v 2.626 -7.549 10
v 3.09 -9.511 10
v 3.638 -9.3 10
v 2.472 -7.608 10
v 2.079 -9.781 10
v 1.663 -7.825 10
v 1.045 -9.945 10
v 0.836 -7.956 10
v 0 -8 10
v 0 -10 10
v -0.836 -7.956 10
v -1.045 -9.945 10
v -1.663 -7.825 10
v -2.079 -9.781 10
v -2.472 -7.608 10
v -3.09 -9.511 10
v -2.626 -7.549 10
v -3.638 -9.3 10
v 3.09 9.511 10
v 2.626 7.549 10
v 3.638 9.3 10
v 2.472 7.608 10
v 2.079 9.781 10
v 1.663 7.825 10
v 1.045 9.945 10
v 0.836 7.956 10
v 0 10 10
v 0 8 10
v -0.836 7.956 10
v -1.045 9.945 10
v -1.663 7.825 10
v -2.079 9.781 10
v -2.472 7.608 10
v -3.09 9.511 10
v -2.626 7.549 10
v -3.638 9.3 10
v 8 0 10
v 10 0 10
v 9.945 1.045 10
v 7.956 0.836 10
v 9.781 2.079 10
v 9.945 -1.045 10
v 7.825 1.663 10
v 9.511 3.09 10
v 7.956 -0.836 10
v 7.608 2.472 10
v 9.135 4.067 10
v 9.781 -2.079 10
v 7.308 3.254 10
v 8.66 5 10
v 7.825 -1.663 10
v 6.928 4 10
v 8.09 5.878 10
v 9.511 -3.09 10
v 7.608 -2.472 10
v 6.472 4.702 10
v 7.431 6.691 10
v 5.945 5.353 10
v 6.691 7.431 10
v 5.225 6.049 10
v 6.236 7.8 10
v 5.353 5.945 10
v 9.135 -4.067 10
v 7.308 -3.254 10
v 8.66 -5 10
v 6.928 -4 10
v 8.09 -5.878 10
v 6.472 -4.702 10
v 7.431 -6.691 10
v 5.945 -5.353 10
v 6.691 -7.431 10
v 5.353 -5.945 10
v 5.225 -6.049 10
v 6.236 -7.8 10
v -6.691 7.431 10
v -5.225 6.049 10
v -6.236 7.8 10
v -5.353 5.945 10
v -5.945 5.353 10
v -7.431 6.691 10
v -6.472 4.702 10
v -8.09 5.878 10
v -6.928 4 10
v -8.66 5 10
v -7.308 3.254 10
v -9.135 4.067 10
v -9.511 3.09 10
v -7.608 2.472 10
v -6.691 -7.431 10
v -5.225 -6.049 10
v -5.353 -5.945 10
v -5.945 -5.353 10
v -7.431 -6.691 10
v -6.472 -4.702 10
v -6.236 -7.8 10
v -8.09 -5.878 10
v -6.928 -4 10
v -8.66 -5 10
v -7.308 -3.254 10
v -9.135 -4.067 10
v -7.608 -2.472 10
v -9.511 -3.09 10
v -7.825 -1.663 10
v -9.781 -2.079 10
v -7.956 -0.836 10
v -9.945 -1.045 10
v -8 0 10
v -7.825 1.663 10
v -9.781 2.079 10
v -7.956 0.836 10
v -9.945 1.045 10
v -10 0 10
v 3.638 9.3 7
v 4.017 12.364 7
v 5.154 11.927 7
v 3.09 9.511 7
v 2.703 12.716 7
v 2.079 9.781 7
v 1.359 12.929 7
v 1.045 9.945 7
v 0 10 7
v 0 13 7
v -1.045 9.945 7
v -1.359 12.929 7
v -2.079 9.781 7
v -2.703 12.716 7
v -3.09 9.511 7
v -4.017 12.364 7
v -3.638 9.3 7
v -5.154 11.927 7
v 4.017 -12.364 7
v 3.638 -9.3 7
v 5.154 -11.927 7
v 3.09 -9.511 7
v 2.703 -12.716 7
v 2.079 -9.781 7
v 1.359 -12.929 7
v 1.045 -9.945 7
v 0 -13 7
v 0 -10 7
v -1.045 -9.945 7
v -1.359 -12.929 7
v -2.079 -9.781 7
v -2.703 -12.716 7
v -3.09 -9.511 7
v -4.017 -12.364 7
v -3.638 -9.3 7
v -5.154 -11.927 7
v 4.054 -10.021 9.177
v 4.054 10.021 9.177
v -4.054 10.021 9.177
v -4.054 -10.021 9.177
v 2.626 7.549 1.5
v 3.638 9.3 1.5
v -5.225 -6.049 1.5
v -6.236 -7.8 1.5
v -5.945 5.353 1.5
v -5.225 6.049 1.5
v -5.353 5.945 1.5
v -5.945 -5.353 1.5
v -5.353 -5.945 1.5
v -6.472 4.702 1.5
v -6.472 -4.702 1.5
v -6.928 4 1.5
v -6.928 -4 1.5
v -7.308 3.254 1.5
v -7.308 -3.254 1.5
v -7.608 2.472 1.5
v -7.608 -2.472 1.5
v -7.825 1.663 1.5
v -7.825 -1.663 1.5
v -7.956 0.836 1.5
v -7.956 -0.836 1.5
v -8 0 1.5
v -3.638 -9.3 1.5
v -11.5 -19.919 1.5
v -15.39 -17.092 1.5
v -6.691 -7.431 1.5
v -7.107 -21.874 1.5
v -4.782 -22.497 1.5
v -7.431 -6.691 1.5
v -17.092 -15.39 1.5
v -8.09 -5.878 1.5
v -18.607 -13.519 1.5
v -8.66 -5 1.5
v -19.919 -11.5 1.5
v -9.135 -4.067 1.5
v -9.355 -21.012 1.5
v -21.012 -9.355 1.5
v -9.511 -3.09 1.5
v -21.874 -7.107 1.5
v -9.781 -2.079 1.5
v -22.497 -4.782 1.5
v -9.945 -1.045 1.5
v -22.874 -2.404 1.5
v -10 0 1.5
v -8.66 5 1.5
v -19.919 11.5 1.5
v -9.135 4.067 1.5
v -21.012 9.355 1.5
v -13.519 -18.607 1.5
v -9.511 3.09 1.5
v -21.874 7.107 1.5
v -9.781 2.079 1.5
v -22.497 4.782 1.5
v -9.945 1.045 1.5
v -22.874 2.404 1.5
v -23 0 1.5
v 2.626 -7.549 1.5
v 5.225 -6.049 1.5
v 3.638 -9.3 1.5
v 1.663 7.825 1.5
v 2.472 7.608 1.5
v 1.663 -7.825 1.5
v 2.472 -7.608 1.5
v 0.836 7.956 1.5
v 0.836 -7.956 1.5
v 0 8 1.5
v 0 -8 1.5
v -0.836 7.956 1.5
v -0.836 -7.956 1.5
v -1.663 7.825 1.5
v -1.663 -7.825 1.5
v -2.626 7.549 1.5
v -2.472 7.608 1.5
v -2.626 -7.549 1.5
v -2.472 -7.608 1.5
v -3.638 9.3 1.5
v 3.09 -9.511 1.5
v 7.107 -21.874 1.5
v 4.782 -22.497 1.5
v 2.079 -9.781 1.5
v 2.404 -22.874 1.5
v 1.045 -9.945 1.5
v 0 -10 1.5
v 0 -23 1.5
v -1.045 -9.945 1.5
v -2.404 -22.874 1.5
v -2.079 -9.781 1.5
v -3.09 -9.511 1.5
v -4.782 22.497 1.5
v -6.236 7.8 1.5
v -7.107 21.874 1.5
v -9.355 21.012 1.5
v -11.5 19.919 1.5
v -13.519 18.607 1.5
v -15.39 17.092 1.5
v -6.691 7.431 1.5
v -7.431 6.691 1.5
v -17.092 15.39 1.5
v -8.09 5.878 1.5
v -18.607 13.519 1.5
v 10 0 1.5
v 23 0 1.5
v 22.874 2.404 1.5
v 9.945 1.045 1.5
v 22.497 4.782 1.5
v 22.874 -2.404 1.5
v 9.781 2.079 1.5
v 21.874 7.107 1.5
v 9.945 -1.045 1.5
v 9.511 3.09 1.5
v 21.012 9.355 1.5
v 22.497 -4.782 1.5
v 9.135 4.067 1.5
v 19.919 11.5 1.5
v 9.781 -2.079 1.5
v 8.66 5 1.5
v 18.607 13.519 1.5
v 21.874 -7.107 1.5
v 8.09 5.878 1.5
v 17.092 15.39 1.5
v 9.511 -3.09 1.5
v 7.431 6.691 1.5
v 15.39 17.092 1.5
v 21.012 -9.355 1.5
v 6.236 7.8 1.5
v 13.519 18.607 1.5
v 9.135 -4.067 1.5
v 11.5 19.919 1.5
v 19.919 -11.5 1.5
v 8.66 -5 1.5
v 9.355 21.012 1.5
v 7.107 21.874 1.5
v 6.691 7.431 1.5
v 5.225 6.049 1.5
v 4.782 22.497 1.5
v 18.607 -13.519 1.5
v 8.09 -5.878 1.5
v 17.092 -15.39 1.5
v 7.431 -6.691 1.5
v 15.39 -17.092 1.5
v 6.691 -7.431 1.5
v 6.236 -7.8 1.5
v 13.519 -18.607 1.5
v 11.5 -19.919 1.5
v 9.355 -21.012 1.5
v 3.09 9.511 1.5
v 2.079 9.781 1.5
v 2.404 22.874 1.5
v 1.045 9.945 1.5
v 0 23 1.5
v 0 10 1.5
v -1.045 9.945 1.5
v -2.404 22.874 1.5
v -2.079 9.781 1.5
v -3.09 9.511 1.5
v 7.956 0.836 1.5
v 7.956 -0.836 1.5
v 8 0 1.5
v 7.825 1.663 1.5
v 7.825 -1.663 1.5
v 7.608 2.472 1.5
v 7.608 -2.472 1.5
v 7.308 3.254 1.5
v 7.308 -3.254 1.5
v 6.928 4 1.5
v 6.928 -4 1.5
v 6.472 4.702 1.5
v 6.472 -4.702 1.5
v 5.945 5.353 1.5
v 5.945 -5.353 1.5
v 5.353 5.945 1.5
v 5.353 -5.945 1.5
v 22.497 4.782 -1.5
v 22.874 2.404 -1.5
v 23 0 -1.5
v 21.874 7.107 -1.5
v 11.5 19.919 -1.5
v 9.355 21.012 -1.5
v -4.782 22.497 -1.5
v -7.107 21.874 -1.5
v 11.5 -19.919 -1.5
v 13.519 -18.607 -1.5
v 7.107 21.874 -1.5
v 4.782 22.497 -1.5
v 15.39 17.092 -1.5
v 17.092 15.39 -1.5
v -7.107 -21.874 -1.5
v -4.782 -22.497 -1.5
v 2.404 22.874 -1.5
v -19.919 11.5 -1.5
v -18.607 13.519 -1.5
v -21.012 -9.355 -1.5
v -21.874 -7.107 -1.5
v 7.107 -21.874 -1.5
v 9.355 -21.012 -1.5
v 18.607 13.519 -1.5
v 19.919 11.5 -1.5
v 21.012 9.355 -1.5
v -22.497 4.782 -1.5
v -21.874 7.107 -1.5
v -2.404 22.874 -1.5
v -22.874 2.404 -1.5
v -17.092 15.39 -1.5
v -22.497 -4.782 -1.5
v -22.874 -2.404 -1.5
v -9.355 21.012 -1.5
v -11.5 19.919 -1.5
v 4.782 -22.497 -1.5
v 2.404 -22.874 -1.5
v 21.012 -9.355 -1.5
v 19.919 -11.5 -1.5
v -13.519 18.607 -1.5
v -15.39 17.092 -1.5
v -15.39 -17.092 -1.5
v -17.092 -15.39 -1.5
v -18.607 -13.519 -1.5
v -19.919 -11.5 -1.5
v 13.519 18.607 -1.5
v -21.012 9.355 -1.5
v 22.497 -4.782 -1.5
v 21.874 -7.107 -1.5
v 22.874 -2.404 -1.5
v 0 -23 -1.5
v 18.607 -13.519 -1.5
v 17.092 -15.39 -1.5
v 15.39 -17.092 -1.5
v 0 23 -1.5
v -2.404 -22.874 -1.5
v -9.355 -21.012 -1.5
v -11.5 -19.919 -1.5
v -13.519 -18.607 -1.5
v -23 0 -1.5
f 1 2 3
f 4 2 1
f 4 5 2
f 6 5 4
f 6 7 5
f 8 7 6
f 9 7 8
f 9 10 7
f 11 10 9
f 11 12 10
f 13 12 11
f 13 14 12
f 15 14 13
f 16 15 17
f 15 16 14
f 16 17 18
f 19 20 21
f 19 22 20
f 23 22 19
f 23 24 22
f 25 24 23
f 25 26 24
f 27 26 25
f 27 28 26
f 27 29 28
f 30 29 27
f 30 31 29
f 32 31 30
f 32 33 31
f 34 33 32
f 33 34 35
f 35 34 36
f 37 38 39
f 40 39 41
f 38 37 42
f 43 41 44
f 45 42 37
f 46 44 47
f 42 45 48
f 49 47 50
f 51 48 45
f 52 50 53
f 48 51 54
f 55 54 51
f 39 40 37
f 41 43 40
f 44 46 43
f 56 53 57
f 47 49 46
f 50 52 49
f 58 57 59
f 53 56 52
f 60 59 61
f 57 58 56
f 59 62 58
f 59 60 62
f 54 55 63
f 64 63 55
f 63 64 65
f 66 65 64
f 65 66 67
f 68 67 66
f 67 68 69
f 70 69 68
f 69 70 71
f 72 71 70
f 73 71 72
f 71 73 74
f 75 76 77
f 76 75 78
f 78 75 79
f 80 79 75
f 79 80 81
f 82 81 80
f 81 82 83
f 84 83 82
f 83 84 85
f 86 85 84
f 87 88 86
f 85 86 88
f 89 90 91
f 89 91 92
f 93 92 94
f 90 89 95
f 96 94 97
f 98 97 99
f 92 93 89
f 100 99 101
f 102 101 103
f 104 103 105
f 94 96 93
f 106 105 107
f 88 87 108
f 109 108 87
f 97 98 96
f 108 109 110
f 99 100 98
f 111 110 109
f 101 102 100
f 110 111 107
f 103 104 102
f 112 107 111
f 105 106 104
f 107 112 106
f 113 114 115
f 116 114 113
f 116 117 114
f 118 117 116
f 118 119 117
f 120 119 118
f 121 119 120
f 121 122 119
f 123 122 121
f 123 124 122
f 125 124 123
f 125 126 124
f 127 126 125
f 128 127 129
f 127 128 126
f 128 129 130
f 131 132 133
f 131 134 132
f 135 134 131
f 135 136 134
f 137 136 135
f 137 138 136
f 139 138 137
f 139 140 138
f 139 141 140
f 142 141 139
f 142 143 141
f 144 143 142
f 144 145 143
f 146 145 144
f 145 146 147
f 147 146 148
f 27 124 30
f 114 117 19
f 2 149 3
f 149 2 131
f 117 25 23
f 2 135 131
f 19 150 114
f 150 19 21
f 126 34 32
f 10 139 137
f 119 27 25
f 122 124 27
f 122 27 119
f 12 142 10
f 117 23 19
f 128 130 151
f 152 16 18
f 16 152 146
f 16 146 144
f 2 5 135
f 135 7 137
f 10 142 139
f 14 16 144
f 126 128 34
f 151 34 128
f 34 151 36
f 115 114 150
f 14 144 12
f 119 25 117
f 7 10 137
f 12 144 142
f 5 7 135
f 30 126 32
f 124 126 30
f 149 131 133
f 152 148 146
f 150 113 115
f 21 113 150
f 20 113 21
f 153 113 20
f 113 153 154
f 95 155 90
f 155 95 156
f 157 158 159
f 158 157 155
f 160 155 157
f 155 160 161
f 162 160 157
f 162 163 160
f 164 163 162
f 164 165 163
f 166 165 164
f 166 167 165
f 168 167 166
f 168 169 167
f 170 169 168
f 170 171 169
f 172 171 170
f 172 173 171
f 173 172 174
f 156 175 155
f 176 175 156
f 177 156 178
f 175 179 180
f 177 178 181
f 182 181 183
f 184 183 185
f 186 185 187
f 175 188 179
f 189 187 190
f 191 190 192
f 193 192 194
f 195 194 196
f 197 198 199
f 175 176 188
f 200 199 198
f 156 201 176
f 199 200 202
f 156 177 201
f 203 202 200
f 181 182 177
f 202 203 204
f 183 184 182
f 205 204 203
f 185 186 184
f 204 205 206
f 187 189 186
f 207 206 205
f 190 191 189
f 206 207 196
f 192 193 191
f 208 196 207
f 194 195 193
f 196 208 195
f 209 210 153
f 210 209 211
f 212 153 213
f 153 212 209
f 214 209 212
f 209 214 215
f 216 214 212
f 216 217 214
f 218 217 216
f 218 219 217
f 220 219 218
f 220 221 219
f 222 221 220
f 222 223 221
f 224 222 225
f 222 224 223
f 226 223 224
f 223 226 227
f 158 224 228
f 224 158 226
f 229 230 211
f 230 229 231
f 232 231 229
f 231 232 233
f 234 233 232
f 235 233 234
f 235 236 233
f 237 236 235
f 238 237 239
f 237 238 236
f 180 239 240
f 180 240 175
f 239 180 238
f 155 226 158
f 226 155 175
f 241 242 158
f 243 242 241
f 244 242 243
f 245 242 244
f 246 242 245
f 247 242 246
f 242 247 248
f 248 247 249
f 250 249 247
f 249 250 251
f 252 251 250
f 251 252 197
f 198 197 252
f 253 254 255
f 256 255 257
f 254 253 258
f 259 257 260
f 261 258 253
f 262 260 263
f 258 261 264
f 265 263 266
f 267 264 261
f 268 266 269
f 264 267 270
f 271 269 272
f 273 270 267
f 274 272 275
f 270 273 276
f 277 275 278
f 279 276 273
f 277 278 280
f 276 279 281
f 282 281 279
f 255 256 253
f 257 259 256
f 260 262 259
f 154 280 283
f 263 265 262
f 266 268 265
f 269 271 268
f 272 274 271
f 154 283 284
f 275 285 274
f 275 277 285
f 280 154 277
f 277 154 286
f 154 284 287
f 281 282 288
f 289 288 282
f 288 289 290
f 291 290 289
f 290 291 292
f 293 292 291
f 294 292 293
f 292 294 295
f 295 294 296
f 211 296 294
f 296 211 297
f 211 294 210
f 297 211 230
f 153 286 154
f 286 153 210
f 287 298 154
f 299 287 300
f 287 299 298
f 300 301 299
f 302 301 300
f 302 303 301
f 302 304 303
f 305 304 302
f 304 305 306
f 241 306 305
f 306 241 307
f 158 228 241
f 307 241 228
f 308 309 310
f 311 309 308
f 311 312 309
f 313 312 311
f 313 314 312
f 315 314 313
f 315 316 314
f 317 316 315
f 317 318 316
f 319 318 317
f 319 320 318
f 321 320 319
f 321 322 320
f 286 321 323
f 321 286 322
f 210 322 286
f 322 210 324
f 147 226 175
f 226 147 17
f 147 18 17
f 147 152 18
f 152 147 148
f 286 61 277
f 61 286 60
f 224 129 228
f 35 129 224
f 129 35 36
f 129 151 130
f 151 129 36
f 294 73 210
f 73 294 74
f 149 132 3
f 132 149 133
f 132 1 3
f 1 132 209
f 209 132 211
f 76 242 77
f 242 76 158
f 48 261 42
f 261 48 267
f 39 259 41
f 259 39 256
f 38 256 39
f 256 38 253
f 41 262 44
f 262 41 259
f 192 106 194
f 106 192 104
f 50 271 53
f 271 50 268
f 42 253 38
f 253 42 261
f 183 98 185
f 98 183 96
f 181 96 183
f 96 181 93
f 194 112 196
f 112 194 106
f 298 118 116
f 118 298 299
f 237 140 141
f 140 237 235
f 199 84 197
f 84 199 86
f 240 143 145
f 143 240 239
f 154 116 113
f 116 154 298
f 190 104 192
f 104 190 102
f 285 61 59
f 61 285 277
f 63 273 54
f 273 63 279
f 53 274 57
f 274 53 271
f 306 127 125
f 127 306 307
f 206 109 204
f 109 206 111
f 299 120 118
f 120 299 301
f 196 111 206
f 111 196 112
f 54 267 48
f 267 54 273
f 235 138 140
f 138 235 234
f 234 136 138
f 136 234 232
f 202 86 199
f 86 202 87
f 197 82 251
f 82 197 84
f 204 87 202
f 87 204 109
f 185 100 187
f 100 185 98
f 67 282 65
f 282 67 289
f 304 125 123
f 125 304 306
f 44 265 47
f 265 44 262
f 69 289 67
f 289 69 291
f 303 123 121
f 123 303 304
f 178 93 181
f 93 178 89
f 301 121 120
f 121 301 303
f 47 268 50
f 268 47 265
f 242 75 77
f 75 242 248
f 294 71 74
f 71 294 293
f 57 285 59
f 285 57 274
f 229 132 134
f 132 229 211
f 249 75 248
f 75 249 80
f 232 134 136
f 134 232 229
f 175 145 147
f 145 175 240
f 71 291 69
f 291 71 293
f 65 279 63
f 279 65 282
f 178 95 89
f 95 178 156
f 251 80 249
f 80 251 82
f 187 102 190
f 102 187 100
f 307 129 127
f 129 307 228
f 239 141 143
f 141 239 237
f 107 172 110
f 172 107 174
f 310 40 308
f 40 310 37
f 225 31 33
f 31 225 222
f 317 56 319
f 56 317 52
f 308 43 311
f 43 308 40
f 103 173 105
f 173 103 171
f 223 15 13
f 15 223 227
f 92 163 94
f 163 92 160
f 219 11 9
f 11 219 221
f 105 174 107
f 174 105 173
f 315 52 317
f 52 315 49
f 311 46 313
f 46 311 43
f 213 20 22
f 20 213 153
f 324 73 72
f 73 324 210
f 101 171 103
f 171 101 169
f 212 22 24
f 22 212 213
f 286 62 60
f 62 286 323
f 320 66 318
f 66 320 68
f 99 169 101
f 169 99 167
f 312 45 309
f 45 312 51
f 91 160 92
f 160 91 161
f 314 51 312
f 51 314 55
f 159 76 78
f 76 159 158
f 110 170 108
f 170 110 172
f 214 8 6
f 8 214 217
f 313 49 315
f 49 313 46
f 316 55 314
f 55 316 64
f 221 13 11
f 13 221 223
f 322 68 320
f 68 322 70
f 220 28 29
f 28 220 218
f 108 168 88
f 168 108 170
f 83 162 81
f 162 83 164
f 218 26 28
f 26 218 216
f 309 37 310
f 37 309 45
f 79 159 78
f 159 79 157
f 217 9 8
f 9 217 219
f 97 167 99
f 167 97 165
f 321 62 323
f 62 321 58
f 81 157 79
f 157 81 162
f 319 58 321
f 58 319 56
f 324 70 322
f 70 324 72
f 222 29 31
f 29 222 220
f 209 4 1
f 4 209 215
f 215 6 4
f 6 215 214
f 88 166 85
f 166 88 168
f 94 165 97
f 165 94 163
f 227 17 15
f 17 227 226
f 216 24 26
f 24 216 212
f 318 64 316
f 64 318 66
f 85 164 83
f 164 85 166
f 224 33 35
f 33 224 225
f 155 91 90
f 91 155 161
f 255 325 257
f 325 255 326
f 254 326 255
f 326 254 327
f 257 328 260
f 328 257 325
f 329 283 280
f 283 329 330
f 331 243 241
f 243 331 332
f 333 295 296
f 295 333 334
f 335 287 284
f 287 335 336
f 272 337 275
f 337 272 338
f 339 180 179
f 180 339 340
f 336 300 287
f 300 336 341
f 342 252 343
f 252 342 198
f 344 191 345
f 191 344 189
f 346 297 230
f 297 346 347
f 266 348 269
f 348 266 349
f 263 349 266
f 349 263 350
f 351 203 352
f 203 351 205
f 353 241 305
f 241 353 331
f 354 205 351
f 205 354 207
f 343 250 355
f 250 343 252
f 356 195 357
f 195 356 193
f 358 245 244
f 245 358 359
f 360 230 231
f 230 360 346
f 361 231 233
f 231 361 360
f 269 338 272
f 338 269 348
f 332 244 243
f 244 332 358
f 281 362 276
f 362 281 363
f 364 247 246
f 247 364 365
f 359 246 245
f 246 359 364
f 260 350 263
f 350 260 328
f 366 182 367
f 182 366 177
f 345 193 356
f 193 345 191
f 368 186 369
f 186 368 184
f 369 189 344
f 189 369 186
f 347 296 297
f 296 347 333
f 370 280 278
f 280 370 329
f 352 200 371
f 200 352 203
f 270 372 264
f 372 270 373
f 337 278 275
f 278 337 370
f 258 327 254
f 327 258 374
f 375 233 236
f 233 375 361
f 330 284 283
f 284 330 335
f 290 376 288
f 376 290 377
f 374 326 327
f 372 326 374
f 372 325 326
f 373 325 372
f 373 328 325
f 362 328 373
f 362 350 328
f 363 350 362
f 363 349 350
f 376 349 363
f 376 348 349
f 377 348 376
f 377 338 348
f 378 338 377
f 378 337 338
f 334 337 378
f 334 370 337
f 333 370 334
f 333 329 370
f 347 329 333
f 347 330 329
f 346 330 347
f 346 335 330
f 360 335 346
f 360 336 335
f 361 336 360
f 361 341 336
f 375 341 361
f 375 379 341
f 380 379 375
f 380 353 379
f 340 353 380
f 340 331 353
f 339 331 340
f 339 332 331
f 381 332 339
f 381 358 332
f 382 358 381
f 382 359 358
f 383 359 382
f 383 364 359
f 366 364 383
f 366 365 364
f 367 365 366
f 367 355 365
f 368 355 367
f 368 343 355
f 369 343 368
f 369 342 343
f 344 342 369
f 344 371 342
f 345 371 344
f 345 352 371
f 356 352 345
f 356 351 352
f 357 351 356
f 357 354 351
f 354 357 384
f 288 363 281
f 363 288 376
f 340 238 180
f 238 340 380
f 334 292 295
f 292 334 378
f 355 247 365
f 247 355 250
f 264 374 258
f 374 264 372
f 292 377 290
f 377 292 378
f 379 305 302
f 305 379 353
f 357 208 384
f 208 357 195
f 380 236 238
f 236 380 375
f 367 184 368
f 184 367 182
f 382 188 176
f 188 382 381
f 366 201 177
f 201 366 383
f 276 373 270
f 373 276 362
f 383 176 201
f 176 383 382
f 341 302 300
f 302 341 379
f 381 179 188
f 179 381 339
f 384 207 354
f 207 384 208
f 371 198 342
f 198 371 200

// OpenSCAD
$fs=0.25;$fa=6;
color([1,0.749,0])union() {
cylinder(h=3, r=23, center=true);
difference(){difference(){union() {
translate([0,0,5.75])cylinder(h=8.5, r=10, center=true);
difference(){intersection(){
translate([0,0,8.5])cylinder(h=3, r1=13, r2=10, center=true);
union() {
translate([0,10,8.5])rotate([0,0,-90])cylinder(h=3, r=10, $fn=3, center=true);
translate([0,-10,8.5])mirror([0,1,0])rotate([0,0,-90])cylinder(h=3, r=10, $fn=3, center=true);
}
}
union() {
translate([0,0,5.75])rotate([0,0,60])cube([27,3,8.5],center=true);
translate([0,0,5.75])rotate([0,0,-60])cube([27,3,8.5],center=true);
}
}}
translate([0,0,5.75])cylinder(h=8.5, r=8, center=true);
}union() {
translate([0,0,5.75])rotate([0,0,60])cube([27,3,8.5],center=true);
translate([0,0,5.75])rotate([0,0,-60])cube([27,3,8.5],center=true);
}
}}
